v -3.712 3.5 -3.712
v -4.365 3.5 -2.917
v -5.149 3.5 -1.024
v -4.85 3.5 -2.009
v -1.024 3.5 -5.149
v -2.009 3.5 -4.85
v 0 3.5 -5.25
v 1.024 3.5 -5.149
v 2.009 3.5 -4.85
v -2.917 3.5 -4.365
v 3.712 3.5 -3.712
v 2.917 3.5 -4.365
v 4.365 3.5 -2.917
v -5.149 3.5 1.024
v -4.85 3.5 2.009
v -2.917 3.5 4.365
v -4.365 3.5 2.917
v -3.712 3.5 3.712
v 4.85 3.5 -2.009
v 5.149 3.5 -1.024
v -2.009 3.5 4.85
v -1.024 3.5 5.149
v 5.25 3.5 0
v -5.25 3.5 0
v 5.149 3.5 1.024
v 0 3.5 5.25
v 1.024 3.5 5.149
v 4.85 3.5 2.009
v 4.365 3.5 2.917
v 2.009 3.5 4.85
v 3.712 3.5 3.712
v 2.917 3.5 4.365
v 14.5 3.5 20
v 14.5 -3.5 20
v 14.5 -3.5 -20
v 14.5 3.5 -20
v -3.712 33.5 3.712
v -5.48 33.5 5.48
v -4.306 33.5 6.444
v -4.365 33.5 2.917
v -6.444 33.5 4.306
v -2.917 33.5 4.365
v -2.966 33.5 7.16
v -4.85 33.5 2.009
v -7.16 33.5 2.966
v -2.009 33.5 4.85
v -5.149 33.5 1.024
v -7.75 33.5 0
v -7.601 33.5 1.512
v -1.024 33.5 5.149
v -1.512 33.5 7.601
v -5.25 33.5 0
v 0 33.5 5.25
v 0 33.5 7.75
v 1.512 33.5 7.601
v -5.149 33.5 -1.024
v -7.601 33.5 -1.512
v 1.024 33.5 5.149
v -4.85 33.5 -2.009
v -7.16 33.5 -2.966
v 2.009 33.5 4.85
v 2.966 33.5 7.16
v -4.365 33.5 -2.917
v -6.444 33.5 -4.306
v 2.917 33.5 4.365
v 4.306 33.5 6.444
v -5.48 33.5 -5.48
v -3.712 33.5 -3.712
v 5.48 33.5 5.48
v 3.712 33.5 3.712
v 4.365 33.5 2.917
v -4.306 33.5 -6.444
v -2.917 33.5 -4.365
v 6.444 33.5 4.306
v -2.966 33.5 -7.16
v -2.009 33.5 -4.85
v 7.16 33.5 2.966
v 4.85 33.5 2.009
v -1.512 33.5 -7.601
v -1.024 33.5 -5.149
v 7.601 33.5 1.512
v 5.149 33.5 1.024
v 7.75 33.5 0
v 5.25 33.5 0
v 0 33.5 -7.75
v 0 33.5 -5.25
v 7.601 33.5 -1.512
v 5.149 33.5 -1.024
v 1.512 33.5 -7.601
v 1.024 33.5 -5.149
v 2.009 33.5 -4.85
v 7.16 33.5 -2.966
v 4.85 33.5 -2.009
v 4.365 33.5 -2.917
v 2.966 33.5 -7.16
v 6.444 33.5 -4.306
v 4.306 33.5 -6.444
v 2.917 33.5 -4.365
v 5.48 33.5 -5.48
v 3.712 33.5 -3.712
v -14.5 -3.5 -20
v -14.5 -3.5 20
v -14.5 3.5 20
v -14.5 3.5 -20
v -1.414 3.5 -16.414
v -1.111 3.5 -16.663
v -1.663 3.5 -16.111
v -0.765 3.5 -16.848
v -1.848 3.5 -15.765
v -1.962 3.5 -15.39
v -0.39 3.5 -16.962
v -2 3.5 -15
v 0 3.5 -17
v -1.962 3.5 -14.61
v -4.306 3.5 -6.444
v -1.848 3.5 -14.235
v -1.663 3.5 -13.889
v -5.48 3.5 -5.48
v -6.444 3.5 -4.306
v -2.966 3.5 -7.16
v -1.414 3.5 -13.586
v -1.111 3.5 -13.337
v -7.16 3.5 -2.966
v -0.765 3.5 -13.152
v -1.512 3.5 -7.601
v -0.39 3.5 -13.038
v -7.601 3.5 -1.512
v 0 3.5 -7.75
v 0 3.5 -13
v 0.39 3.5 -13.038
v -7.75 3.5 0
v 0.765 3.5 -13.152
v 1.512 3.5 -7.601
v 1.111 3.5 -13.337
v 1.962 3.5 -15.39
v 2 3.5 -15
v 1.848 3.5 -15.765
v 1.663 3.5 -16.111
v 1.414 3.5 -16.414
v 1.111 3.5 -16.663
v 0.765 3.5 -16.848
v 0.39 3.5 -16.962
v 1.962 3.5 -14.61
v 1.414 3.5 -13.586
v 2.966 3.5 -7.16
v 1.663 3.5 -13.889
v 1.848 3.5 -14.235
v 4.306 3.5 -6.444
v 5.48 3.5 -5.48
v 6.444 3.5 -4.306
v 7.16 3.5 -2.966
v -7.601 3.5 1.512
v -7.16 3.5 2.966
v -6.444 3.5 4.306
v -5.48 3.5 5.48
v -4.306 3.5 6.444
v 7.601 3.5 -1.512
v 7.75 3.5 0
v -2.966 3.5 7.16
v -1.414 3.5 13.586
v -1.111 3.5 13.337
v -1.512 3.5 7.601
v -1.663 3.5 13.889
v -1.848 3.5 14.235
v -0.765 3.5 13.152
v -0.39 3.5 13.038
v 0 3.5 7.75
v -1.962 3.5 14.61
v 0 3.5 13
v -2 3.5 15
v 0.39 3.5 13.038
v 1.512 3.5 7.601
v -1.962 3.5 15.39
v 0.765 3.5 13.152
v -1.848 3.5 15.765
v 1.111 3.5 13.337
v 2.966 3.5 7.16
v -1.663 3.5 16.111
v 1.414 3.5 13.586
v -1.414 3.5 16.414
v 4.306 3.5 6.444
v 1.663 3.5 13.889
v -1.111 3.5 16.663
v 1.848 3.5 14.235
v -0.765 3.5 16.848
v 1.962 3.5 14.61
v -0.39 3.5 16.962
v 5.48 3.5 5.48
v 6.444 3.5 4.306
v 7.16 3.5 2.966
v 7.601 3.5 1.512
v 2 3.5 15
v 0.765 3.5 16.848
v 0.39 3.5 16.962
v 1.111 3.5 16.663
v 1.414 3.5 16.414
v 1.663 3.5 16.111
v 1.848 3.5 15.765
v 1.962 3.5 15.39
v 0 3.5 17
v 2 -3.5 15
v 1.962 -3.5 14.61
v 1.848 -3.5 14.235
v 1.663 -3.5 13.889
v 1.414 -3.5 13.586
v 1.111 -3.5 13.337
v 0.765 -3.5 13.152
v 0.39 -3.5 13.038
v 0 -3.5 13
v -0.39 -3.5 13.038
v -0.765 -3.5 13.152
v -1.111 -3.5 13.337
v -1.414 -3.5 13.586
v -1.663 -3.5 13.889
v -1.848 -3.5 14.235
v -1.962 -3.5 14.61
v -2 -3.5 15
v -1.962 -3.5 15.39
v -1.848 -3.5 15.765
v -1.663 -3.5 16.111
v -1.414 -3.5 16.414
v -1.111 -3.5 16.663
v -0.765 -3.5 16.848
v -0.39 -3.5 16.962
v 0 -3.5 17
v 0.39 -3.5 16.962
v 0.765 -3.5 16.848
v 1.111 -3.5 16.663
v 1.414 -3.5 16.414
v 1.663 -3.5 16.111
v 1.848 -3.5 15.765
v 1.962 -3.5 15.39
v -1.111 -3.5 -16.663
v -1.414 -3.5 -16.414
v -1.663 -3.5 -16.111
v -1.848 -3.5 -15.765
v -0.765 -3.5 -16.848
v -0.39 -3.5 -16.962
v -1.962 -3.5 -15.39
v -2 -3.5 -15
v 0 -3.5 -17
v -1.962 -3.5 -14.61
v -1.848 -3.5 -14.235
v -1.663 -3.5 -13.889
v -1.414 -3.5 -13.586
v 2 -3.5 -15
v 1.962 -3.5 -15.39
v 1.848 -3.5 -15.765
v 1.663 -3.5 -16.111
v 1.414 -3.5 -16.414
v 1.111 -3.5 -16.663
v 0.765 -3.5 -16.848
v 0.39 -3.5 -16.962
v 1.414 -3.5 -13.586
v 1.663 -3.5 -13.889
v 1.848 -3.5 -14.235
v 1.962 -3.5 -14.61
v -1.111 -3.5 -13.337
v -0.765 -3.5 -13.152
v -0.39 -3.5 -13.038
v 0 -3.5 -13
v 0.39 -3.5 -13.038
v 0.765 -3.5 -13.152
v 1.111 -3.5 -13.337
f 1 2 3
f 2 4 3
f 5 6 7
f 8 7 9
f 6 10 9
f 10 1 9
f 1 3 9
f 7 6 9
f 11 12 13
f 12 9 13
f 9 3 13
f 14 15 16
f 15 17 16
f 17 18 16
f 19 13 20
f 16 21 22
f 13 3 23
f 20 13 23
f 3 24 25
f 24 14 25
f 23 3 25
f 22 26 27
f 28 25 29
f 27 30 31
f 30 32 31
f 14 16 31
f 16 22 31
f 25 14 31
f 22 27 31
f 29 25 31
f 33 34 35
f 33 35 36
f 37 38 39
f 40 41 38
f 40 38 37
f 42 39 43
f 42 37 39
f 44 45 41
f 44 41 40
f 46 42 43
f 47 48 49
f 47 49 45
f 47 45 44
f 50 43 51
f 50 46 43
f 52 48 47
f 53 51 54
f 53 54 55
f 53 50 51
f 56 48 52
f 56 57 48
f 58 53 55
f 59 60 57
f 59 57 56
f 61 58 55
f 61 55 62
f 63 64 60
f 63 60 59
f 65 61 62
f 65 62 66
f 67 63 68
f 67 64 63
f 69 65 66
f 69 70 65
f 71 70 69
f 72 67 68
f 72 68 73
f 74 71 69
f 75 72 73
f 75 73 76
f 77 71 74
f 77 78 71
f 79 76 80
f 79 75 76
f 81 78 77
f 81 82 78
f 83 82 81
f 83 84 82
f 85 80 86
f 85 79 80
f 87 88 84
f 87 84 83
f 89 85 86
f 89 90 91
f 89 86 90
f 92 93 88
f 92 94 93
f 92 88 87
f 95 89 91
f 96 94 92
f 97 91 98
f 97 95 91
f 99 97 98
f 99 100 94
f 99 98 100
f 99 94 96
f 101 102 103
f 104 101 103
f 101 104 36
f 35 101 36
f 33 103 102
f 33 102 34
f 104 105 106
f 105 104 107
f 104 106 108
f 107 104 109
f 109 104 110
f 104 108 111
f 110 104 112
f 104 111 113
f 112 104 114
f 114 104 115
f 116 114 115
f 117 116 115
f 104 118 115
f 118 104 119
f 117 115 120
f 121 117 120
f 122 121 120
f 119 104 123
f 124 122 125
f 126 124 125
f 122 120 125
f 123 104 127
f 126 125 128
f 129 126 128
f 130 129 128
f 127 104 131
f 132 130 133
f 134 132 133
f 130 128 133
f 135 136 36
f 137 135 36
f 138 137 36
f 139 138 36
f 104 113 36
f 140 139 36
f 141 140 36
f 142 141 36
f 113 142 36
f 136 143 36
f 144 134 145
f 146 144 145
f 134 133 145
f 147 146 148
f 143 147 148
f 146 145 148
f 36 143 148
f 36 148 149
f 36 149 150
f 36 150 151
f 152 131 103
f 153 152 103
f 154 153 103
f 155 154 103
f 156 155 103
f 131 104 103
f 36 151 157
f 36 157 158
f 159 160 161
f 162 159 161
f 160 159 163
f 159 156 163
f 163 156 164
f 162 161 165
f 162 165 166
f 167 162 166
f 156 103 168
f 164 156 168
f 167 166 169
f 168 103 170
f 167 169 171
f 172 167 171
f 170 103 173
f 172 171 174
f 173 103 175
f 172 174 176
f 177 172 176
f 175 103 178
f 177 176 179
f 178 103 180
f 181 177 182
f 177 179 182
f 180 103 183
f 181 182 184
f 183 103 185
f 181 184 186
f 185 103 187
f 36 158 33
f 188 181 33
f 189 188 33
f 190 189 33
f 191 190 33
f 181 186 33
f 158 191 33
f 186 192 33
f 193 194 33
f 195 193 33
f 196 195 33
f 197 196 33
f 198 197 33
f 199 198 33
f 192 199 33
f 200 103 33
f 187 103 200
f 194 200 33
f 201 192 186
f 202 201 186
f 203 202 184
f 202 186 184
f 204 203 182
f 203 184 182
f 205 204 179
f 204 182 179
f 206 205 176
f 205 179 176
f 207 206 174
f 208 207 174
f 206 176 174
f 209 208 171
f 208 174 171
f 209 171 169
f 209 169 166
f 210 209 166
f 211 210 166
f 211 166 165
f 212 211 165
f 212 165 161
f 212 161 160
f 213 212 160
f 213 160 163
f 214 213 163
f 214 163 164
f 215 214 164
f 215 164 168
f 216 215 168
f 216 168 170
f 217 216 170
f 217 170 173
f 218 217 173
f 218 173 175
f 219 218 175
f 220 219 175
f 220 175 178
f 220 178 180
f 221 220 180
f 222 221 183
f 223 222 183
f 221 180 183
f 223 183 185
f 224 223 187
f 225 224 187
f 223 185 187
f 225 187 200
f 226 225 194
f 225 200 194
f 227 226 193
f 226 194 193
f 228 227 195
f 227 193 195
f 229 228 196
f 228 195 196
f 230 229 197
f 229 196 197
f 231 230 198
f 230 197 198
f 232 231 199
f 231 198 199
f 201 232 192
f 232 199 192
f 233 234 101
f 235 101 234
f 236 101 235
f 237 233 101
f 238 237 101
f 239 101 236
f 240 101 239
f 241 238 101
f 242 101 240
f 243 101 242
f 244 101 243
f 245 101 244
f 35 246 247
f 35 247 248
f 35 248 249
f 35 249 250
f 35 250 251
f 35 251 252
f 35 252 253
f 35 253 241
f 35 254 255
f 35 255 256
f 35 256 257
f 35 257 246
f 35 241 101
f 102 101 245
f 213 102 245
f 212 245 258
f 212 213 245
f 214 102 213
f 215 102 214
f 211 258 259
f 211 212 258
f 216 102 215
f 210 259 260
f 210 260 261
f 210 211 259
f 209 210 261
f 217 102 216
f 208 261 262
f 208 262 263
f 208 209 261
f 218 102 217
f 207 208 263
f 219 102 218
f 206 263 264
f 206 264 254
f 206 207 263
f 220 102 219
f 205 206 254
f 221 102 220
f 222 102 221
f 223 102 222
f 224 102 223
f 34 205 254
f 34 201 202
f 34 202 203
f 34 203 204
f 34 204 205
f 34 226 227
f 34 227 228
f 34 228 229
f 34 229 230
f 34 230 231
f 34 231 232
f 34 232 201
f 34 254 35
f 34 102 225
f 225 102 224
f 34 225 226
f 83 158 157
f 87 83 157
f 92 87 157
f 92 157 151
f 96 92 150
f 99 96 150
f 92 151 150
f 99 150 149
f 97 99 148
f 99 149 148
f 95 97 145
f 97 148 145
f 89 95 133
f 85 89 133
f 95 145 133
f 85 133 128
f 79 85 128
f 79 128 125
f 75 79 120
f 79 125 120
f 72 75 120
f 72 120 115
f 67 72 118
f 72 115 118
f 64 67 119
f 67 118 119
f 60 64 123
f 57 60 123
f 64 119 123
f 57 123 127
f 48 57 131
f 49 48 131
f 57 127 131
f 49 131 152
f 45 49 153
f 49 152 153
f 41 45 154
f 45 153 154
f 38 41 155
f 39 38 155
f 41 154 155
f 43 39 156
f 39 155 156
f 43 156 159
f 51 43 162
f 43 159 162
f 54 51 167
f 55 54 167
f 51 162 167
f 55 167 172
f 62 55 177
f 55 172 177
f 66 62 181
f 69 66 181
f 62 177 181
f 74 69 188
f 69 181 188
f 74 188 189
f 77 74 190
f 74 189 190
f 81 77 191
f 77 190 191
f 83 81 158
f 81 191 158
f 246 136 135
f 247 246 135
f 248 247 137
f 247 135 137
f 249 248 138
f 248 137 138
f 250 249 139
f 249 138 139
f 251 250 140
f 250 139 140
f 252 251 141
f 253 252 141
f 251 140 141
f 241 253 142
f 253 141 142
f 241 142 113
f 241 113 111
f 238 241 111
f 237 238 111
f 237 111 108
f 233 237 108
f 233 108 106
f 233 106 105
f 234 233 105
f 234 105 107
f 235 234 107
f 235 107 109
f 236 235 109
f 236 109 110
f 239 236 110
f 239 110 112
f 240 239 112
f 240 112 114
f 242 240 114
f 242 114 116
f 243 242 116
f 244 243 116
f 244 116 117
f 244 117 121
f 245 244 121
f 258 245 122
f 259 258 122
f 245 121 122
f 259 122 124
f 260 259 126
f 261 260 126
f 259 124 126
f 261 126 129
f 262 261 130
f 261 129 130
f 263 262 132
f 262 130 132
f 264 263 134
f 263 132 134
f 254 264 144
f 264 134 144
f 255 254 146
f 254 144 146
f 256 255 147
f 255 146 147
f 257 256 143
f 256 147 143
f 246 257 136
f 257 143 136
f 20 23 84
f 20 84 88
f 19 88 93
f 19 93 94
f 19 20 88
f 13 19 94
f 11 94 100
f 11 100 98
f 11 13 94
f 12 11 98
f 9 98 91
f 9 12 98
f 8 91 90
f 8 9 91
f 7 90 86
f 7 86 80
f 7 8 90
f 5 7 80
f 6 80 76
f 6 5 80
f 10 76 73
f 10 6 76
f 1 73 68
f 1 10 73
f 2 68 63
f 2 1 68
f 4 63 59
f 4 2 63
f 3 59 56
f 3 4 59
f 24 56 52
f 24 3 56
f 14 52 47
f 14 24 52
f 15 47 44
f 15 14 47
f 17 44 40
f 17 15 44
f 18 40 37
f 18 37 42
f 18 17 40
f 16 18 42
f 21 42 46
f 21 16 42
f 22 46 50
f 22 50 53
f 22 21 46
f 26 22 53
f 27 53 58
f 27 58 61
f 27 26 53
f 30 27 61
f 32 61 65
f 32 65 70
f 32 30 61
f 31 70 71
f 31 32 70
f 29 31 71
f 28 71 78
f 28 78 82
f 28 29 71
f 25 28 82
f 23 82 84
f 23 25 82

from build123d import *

# Parameters (mm, degrees)
SKETCH1_W           = 29
SKETCH1_H           = 7
BOSS_EXTRUDE1_DEPTH = 20
SKETCH2_R           = 2
CUT_EXTRUDE1_DEPTH  = 8
SKETCH3_R           = 7.75
SKETCH3_R_2         = 5.25
EXTRUDE_THIN1_DEPTH = 30


with BuildPart() as part:
    # Sketch1 → Boss-Extrude1 (new body, symmetric)
    with BuildSketch(Plane.XY):
        Rectangle(SKETCH1_W, SKETCH1_H)
    extrude(amount=BOSS_EXTRUDE1_DEPTH, both=True)

    # Sketch2 → Cut-Extrude1 (cut, through all)
    with BuildSketch(Plane(origin=(0, 3.5, 0), x_dir=(1, 0, 0), z_dir=(0, 1, 0))):
        with Locations((0, 15)):
            Circle(SKETCH2_R)
        with Locations((0, -15)):
            Circle(SKETCH2_R)
    extrude(amount=-CUT_EXTRUDE1_DEPTH, mode=Mode.SUBTRACT)

    # Sketch3 → Extrude-Thin1 (add)
    with BuildSketch(Plane(origin=(0, 3.5, 0), x_dir=(1, 0, 0), z_dir=(0, 1, 0))):
        Circle(SKETCH3_R)
        Circle(SKETCH3_R_2, mode=Mode.SUBTRACT)
    extrude(amount=EXTRUDE_THIN1_DEPTH)


solid = part.part
